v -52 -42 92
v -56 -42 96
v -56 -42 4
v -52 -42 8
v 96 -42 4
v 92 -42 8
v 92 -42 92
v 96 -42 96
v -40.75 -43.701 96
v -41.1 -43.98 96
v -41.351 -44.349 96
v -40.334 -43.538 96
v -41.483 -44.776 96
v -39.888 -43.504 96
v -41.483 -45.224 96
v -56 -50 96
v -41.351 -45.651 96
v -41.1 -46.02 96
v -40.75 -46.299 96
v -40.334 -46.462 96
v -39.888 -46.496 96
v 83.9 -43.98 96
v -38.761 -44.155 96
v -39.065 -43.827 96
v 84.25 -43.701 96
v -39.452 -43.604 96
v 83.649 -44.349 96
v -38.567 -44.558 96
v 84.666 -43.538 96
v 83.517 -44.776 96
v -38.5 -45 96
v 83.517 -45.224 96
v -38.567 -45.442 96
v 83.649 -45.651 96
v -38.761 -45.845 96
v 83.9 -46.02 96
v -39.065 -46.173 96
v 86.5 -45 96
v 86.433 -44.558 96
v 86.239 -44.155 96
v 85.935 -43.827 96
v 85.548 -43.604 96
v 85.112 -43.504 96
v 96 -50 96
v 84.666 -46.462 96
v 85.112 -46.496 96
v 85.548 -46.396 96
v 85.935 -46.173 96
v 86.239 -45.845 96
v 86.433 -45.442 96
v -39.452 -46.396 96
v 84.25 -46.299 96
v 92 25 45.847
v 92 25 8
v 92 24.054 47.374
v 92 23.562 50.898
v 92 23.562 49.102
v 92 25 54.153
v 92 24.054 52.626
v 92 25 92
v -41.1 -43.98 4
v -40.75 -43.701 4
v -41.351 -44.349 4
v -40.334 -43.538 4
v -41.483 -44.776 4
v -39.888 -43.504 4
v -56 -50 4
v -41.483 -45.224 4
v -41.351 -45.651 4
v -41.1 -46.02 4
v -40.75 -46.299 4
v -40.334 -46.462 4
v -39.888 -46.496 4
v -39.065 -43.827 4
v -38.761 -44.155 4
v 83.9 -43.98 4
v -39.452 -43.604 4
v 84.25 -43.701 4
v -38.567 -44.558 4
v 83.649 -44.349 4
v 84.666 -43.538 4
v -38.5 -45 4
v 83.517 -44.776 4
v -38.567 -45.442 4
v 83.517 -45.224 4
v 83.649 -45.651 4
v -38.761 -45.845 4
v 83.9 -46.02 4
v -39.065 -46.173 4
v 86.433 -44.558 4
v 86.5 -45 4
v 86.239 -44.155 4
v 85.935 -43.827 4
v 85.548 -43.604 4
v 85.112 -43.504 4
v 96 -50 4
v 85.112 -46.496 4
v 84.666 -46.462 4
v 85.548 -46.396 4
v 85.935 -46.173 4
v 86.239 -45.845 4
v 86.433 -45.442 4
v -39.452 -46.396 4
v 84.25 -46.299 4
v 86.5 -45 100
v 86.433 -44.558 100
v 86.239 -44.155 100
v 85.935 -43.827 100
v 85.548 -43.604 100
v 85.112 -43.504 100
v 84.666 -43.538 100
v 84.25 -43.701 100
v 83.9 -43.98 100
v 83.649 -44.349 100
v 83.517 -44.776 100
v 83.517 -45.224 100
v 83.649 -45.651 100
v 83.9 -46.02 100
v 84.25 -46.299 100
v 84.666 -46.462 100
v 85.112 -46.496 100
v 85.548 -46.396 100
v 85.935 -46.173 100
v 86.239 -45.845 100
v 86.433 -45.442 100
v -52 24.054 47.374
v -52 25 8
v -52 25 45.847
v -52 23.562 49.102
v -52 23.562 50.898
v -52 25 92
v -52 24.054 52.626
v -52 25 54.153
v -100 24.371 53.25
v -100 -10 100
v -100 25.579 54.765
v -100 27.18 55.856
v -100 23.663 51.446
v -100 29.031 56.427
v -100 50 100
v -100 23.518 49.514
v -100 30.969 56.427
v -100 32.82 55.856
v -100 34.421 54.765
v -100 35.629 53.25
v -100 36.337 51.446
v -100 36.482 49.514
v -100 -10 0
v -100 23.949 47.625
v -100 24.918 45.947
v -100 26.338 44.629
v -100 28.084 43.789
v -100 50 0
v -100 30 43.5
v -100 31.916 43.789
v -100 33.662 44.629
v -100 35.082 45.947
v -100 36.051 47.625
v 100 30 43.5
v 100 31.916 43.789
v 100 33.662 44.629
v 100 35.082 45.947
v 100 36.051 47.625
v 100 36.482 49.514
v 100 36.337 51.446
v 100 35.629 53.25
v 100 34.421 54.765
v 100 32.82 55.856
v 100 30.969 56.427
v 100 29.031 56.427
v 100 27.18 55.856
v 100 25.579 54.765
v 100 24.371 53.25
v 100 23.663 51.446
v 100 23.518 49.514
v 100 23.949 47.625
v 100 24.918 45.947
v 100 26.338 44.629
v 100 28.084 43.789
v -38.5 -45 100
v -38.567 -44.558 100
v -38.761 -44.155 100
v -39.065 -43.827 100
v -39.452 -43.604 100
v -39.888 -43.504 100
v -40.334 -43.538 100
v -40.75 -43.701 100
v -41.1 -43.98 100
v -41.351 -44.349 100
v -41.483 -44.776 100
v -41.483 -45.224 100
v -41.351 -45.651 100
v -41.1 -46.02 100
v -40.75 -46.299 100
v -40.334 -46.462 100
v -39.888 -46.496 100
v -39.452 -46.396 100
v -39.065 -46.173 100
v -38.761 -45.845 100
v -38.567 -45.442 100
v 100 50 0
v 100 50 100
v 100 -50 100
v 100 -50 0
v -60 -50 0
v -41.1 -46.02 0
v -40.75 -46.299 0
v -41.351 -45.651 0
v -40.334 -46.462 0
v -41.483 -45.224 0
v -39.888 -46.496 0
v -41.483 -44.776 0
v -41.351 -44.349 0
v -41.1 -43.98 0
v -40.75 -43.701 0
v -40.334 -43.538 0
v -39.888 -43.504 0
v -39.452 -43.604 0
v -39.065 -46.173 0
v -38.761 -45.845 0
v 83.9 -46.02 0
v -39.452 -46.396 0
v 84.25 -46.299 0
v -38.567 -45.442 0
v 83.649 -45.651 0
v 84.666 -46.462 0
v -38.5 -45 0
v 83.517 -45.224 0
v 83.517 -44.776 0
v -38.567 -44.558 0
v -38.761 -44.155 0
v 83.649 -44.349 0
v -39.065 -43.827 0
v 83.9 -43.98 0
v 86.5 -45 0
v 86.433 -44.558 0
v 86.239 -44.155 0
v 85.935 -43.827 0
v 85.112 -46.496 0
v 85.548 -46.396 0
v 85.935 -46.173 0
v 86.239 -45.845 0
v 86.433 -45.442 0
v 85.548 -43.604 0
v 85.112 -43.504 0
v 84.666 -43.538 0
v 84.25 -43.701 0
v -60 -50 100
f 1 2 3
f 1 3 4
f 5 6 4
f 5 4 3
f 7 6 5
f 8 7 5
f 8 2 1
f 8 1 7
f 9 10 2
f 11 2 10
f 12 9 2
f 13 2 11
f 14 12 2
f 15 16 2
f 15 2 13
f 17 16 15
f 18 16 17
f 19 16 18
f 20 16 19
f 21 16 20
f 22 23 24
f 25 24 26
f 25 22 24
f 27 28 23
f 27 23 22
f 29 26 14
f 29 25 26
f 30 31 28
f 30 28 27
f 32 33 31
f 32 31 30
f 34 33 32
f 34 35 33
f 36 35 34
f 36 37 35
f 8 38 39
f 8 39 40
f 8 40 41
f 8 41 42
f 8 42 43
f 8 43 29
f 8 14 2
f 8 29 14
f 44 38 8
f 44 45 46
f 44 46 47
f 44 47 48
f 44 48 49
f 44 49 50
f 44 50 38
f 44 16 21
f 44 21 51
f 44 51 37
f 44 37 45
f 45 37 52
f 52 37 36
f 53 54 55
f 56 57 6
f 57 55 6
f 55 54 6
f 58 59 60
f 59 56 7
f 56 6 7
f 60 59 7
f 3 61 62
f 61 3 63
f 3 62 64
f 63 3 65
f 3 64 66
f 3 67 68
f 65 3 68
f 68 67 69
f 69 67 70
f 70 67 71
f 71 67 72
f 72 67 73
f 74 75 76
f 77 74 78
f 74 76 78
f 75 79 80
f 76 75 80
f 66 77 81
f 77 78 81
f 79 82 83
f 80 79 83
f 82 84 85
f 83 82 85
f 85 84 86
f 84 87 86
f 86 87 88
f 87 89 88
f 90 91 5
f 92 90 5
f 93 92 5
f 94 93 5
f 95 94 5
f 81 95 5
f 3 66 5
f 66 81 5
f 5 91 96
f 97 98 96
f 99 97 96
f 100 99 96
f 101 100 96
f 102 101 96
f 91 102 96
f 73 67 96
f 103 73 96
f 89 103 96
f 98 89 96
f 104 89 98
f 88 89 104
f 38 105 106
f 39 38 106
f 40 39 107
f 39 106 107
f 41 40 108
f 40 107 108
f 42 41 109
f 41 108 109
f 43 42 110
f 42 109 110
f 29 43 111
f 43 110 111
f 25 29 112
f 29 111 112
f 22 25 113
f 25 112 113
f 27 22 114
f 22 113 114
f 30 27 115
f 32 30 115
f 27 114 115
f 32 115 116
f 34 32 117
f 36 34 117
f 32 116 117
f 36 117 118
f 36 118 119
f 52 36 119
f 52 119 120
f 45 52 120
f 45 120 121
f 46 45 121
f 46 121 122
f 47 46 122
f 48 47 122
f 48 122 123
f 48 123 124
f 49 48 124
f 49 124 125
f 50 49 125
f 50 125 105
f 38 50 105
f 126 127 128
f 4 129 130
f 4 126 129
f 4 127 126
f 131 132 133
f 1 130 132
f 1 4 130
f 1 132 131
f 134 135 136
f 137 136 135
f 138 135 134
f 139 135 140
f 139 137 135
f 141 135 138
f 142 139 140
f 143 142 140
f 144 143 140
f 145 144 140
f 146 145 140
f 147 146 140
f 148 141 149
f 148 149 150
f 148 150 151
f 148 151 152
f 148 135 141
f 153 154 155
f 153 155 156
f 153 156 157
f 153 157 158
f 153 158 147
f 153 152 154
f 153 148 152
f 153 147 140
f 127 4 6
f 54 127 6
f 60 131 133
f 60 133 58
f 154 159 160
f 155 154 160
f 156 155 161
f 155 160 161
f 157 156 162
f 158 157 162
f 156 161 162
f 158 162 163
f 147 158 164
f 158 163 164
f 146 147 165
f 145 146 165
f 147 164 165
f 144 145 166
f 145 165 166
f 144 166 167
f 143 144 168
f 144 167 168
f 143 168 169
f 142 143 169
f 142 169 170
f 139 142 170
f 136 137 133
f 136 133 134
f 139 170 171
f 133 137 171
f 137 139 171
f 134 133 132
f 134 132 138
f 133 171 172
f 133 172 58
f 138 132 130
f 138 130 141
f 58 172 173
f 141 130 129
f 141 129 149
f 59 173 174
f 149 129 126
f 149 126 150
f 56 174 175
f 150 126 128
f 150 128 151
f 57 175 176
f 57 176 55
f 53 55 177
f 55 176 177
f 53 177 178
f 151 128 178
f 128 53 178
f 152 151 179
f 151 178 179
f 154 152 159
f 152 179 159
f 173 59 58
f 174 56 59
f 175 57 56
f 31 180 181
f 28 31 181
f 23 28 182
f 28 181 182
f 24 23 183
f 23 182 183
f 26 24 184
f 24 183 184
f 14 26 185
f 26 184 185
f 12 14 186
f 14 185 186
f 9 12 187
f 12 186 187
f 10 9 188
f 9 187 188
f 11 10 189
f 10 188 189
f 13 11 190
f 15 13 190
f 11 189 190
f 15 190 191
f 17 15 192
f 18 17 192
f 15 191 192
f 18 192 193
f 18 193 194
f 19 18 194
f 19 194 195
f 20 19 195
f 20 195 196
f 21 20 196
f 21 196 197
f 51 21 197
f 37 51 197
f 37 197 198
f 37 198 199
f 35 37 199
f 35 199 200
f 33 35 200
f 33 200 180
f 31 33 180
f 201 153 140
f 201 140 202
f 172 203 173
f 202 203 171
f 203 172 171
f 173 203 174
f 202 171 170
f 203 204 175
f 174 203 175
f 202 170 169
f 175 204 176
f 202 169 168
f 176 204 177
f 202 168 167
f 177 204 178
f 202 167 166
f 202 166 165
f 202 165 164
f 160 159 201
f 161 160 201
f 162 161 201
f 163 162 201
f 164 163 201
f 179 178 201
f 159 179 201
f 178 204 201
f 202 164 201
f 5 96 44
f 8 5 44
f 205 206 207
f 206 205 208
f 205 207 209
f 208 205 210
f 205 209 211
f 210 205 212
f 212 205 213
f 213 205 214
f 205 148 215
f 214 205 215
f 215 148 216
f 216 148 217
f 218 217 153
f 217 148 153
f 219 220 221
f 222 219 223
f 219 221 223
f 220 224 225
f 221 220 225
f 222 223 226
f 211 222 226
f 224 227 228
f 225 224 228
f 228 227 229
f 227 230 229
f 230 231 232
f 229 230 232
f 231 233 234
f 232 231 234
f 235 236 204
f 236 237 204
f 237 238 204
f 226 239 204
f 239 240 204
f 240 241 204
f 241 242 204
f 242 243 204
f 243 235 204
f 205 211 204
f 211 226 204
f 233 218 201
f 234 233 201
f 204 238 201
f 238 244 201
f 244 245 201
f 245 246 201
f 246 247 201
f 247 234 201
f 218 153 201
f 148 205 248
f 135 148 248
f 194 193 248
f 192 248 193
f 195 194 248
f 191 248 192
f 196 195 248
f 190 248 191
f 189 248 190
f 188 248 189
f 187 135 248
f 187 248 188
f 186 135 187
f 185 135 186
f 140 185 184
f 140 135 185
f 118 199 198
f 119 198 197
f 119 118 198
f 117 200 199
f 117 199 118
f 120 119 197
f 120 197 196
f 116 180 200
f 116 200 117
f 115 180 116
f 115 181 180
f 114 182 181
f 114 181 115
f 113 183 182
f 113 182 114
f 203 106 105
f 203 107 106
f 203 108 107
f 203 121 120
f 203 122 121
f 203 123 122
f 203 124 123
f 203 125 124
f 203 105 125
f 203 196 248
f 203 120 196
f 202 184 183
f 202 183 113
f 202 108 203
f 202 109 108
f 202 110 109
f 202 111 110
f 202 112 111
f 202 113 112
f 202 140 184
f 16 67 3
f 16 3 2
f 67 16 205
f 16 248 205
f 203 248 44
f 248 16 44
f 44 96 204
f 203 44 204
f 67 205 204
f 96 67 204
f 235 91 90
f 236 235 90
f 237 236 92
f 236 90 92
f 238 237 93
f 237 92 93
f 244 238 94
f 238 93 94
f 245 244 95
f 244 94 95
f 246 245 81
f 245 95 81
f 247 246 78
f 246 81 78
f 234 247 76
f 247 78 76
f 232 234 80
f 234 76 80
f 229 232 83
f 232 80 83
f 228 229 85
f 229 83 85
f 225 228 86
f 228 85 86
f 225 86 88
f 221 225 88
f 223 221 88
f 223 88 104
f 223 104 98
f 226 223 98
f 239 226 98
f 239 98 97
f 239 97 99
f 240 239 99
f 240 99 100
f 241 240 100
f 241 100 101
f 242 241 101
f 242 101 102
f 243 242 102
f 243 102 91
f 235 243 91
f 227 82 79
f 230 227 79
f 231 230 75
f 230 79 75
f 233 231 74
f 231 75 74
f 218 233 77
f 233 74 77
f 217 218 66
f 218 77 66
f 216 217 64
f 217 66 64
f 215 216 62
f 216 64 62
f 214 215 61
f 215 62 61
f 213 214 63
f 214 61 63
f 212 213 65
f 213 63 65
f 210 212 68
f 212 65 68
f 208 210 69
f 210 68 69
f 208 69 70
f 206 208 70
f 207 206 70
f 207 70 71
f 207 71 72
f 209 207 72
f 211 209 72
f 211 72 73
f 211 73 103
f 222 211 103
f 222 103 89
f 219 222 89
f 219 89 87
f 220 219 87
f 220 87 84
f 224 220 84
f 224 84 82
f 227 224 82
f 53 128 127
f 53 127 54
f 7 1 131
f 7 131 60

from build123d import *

# Parameters (mm, degrees)
ESQUISSE1_W             = 200
ESQUISSE1_H             = 100
BOSS_EXTRU_1_DEPTH      = 100
CHANFREIN1_SIZE         = 40
ESQUISSE2_R             = 6.5
ENL_V_MAT_EXTRU_1_DEPTH = 230.128784748
ESQUISSE4_R             = 1.5
ENL_V_MAT_EXTRU_3_DEPTH = 151
ESQUISSE5_W             = 144
ESQUISSE5_H             = 84
ENL_V_MAT_EXTRU_4_DEPTH = 75
ESQUISSE6_W             = 152
ESQUISSE6_H             = 92
ENL_V_MAT_EXTRU_5_DEPTH = 8


with BuildPart() as part:
    # Esquisse1 → Boss.-Extru.1 (new body)
    with BuildSketch(Plane.XY):
        Rectangle(ESQUISSE1_W, ESQUISSE1_H)
    extrude(amount=BOSS_EXTRU_1_DEPTH)

    # Chanfrein1
    chanfrein1_edges = [part.edges().sort_by_distance(p)[0] for p in [
        (-100, -50, 50),
    ]]
    chamfer(chanfrein1_edges, length=CHANFREIN1_SIZE)

    # Esquisse2 → Enlèv. mat.-Extru.1 (cut, through all)
    with BuildSketch(Plane(origin=(100, 0, 0), x_dir=(0, 0, -1), z_dir=(1, 0, 0))):
        with Locations((-50, 30)):
            Circle(ESQUISSE2_R)
    extrude(amount=-ENL_V_MAT_EXTRU_1_DEPTH, mode=Mode.SUBTRACT)

    # Esquisse4 → Enlèv. mat.-Extru.3 (cut, through all)
    with BuildSketch(Plane.XY.offset(100)):
        with Locations((85, -45)):
            Circle(ESQUISSE4_R)
        with Locations((-40, -45)):
            Circle(ESQUISSE4_R)
    extrude(amount=-ENL_V_MAT_EXTRU_3_DEPTH, mode=Mode.SUBTRACT)

    # Esquisse5 → Enlèv. mat.-Extru.4 (cut)
    with BuildSketch(Plane.XZ.offset(50)):
        with Locations((20, 50)):
            Rectangle(ESQUISSE5_W, ESQUISSE5_H)
    extrude(amount=-ENL_V_MAT_EXTRU_4_DEPTH, mode=Mode.SUBTRACT)

    # Esquisse6 → Enlèv. mat.-Extru.5 (cut)
    with BuildSketch(Plane.XZ.offset(50)):
        with Locations((20, 50)):
            Rectangle(ESQUISSE6_W, ESQUISSE6_H)
    extrude(amount=-ENL_V_MAT_EXTRU_5_DEPTH, mode=Mode.SUBTRACT)


solid = part.part
